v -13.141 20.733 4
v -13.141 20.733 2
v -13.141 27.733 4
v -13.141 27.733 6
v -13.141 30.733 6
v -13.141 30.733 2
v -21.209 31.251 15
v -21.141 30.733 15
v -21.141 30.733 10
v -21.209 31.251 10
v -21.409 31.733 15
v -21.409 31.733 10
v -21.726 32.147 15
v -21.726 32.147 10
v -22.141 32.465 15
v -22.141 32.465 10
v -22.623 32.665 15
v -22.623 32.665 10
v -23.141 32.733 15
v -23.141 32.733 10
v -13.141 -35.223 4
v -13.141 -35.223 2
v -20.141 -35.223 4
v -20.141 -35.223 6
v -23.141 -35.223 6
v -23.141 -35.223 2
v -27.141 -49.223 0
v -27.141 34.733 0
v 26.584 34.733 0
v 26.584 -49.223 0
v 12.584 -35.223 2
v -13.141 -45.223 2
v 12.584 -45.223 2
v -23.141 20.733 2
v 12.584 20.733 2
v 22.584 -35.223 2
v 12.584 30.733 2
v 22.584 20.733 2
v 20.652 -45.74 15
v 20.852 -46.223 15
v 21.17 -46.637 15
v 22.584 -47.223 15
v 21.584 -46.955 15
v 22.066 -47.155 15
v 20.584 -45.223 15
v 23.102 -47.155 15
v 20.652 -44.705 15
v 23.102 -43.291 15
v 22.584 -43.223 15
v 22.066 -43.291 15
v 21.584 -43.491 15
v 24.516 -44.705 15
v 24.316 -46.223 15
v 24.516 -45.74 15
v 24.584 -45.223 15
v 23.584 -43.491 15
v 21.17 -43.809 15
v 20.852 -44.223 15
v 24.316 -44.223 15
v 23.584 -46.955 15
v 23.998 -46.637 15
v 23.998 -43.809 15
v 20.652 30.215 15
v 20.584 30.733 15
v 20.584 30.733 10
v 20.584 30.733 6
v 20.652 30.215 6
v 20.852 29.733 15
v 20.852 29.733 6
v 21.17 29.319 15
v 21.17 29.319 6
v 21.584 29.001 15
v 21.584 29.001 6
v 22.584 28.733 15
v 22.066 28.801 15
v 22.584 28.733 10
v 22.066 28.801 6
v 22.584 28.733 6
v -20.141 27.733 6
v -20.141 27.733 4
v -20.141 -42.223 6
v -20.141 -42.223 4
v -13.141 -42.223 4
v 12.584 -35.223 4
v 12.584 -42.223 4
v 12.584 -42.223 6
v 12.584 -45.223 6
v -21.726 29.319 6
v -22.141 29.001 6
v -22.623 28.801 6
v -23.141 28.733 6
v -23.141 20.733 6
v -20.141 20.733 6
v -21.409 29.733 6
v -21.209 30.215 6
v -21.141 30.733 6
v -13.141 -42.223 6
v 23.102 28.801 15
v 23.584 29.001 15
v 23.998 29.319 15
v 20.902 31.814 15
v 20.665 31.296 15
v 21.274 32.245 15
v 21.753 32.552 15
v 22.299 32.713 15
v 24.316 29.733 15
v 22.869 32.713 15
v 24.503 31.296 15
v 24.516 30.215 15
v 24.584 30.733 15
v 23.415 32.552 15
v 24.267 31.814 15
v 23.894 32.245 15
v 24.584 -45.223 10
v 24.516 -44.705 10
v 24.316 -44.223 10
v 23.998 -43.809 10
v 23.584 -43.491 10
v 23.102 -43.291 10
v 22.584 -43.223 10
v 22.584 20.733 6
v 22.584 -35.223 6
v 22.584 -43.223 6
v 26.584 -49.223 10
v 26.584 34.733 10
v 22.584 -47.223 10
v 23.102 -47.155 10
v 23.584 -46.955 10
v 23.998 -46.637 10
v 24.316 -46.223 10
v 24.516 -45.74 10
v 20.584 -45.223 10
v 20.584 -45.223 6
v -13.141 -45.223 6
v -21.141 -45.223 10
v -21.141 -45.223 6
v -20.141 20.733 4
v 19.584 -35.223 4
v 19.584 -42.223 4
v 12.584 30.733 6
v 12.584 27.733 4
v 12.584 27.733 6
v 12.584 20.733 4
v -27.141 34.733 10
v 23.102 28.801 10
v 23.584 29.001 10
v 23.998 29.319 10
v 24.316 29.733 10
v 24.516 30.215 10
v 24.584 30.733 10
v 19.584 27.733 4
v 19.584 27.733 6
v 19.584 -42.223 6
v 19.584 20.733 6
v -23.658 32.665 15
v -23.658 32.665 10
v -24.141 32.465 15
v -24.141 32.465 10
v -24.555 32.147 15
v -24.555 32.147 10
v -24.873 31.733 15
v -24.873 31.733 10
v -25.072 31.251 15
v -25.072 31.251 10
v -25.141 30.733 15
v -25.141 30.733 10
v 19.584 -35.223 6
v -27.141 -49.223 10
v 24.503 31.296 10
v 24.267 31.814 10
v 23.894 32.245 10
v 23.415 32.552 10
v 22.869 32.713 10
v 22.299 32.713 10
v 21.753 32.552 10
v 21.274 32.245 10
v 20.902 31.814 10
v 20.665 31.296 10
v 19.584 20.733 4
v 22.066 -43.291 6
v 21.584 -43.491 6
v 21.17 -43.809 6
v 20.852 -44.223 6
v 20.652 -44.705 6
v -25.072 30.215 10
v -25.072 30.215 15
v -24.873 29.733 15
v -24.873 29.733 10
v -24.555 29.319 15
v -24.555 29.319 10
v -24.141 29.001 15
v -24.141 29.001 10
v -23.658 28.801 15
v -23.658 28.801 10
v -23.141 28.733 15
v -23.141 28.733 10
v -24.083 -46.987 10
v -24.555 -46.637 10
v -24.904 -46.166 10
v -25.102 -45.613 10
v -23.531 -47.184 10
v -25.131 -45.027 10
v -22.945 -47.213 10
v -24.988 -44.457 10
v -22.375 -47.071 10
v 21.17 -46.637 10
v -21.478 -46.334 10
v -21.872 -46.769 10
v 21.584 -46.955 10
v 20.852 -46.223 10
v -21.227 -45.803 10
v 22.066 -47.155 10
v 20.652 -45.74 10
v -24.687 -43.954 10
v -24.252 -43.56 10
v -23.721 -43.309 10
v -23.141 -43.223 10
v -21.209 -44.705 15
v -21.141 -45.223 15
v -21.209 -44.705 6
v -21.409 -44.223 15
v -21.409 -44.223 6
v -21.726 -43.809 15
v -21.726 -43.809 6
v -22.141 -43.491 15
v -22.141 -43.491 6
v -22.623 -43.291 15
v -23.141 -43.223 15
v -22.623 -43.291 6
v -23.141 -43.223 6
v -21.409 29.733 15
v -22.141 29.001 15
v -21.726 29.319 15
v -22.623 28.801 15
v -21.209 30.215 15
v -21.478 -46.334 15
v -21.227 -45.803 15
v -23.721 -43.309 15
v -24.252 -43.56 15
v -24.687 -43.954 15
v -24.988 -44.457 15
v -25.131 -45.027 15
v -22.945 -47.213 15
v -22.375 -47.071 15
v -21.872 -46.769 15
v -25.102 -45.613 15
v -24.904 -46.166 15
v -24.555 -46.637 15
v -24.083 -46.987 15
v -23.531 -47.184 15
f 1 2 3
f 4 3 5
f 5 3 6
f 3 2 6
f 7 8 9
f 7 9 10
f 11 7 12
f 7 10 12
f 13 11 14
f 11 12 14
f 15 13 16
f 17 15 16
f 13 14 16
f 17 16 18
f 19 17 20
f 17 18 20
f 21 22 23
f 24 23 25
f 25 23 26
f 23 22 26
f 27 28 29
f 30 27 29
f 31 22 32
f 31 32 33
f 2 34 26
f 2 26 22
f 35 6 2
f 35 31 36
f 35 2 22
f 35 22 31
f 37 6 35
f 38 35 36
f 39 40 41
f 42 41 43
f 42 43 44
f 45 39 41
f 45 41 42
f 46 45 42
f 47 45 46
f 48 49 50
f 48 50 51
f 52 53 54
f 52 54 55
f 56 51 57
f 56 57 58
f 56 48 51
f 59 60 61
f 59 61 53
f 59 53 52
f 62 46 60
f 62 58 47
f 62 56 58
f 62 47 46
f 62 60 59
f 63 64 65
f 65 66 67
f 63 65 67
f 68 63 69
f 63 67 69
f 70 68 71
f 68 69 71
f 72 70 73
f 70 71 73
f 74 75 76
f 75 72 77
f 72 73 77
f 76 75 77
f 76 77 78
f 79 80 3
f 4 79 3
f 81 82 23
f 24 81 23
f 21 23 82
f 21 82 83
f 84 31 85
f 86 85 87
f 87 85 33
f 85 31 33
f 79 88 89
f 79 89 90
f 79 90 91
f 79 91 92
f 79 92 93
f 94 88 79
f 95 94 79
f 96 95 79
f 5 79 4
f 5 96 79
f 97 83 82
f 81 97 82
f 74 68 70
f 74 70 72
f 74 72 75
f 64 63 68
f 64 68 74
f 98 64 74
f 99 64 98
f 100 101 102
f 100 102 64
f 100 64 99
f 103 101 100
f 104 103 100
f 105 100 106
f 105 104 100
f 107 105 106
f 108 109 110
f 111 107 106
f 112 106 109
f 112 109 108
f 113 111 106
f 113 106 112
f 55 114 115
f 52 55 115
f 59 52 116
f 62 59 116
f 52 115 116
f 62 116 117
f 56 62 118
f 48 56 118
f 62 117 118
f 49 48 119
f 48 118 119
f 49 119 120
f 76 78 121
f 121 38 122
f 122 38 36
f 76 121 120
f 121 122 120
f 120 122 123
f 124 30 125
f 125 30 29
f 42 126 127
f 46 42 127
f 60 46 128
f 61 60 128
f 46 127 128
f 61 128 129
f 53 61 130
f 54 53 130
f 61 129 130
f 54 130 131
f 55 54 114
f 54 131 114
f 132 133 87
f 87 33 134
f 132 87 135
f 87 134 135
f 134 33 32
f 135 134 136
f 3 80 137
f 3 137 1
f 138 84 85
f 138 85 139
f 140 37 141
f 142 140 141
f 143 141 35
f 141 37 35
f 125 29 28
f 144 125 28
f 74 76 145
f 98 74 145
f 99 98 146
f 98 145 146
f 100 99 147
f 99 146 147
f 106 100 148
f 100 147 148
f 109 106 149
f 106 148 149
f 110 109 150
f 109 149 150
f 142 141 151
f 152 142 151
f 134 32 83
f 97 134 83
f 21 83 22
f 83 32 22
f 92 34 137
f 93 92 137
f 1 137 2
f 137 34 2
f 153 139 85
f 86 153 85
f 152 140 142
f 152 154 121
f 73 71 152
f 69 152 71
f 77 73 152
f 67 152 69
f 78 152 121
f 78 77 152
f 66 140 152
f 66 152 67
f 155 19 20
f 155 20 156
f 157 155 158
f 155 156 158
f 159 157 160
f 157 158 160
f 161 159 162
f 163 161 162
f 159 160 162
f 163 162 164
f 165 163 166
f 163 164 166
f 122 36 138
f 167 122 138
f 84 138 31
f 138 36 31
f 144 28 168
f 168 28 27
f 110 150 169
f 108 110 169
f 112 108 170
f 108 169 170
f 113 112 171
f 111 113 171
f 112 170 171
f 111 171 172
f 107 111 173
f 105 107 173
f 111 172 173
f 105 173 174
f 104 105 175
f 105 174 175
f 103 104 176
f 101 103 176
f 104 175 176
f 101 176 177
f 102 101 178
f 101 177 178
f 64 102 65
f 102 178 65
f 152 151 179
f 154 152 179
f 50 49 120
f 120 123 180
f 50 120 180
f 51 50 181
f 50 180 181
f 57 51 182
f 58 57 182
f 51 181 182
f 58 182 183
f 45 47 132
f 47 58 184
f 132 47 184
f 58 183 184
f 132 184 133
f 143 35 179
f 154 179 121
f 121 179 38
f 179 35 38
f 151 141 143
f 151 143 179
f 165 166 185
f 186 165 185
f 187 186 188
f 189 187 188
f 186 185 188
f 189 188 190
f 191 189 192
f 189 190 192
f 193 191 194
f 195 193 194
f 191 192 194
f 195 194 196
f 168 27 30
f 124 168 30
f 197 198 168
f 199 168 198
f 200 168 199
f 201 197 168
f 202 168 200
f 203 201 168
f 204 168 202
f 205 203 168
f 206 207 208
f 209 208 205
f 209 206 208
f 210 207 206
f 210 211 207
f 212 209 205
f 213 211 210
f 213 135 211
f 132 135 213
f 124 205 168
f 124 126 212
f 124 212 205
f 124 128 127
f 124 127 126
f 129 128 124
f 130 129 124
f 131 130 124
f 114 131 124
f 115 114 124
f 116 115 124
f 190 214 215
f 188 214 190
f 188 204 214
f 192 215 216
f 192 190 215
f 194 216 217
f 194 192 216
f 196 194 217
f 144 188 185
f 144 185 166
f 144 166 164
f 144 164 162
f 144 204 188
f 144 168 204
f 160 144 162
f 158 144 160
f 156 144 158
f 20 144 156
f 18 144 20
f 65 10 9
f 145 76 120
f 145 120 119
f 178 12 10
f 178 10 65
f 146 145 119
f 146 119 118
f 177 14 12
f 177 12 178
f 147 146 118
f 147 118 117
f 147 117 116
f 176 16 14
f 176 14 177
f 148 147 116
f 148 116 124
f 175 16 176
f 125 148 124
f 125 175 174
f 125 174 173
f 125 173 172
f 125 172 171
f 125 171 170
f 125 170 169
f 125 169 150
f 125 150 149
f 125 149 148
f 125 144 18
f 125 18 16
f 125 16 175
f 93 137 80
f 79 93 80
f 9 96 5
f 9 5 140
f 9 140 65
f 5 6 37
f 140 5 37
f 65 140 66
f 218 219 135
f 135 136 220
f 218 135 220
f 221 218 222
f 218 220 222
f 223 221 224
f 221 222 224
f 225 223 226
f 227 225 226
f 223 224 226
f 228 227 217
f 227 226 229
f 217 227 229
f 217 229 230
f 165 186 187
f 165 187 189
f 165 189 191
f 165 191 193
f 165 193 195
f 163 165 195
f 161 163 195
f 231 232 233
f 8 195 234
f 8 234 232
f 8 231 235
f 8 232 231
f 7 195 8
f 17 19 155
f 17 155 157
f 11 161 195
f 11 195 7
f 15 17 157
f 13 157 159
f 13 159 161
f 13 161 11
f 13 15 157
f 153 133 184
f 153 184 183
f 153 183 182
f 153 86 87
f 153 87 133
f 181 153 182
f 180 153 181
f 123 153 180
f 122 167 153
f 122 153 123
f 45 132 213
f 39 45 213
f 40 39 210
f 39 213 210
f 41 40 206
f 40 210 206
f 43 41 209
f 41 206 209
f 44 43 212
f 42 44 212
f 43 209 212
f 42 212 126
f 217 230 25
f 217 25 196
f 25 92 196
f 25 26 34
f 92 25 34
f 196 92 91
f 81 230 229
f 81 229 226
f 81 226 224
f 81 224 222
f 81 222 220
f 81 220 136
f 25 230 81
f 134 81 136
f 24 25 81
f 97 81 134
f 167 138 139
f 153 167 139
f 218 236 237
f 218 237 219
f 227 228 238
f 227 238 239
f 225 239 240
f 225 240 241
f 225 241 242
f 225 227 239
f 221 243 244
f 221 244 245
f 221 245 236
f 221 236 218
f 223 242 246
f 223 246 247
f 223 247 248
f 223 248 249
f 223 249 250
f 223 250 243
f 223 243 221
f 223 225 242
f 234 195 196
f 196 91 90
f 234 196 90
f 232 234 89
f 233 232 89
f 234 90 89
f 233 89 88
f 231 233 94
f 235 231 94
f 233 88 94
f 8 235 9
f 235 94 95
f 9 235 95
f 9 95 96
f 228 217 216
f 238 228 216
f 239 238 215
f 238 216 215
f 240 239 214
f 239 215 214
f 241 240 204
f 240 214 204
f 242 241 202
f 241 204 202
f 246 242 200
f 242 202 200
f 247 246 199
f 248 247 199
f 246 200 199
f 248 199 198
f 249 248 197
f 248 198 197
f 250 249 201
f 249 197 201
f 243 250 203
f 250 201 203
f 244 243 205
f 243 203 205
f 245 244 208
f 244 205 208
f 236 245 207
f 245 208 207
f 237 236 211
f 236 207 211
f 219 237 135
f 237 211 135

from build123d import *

# Parameters (mm, degrees)
F1_DEPTH = 10
F2_DEPTH = 6
F3_DEPTH = 15
F0_W     = 7
F0_H     = 7
F4_DEPTH = 4
F5_DEPTH = 2


with BuildPart() as f1:
    # F0 (on Top) → F1 (new body)
    with BuildSketch(Plane.XY):
        with BuildLine():
            Line((26.5840129331, 34.7330055023), (-23.1406439107, 34.7330055023))
            Line((-23.1406439107, 34.7330055023), (-23.1406439107, 32.7330055023))
            ThreePointArc((-23.1406439107, 32.7330055023), (-21.7264303483, 32.1472190646), (-21.1406439107, 30.7330055023))
            Line((-21.1406439107, 30.7330055023), (-13.1406439107, 30.7330055023))
            Line((-13.1406439107, 30.7330055023), (12.5840129331, 30.7330055023))
            Line((12.5840129331, 30.7330055023), (20.5840129331, 30.7330055023))
            ThreePointArc((20.5840129331, 30.7330055023), (22.5840129331, 32.7330055023), (24.5840129331, 30.7330055023))
            ThreePointArc((24.5840129331, 30.7330055023), (23.9982264954, 29.3187919399), (22.5840129331, 28.7330055023))
            Line((22.5840129331, 28.7330055023), (22.5840129331, 20.7330055023))
            Line((22.5840129331, 20.7330055023), (22.5840129331, -35.2227493608))
            Line((22.5840129331, -35.2227493608), (22.5840129331, -43.2227493608))
            ThreePointArc((22.5840129331, -43.2227493608), (23.9982264954, -43.8085357985), (24.5840129331, -45.2227493608))
            Line((24.5840129331, -45.2227493608), (26.5840129331, -45.2227493608))
            Line((26.5840129331, -45.2227493608), (26.5840129331, 34.7330055023))
        make_face()
        with BuildLine():
            Line((-23.1406439107, 34.7330055023), (-27.1406439107, 34.7330055023))
            Line((-27.1406439107, 34.7330055023), (-27.1406439107, 30.7330055023))
            Line((-27.1406439107, 30.7330055023), (-25.1406439107, 30.7330055023))
            ThreePointArc((-25.1406439107, 30.7330055023), (-24.5548574731, 32.1472190646), (-23.1406439107, 32.7330055023))
            Line((-23.1406439107, 32.7330055023), (-23.1406439107, 34.7330055023))
        make_face()
        with BuildLine():
            Line((-25.1406439107, 30.7330055023), (-27.1406439107, 30.7330055023))
            Line((-27.1406439107, 30.7330055023), (-27.1406439107, -49.2227493608))
            Line((-27.1406439107, -49.2227493608), (22.5840129331, -49.2227493608))
            Line((22.5840129331, -49.2227493608), (22.5840129331, -47.2227493608))
            ThreePointArc((22.5840129331, -47.2227493608), (21.1697993707, -46.6369629232), (20.5840129331, -45.2227493608))
            Line((20.5840129331, -45.2227493608), (12.5840129331, -45.2227493608))
            Line((12.5840129331, -45.2227493608), (-13.1406439107, -45.2227493608))
            Line((-13.1406439107, -45.2227493608), (-21.1406439107, -45.2227493608))
            ThreePointArc((-21.1406439107, -45.2227493608), (-24.5548574731, -46.6369629232), (-23.1406439107, -43.2227493608))
            Line((-23.1406439107, -43.2227493608), (-23.1406439107, -35.2227493608))
            Line((-23.1406439107, -35.2227493608), (-23.1406439107, 20.7330055023))
            Line((-23.1406439107, 20.7330055023), (-23.1406439107, 28.7330055023))
            ThreePointArc((-23.1406439107, 28.7330055023), (-24.5548574731, 29.3187919399), (-25.1406439107, 30.7330055023))
        make_face()
        with BuildLine():
            Line((26.5840129331, -49.2227493608), (26.5840129331, -45.2227493608))
            Line((26.5840129331, -45.2227493608), (24.5840129331, -45.2227493608))
            ThreePointArc((24.5840129331, -45.2227493608), (23.9982264954, -46.6369629232), (22.5840129331, -47.2227493608))
            Line((22.5840129331, -47.2227493608), (22.5840129331, -49.2227493608))
            Line((22.5840129331, -49.2227493608), (26.5840129331, -49.2227493608))
        make_face()
    extrude(amount=F1_DEPTH)

    # F0 (on Top) → F2 (join)
    with BuildSketch(Plane.XY):
        with BuildLine():
            Line((-13.1406439107, 30.7330055023), (-21.1406439107, 30.7330055023))
            ThreePointArc((-21.1406439107, 30.7330055023), (-21.7264303483, 29.3187919399), (-23.1406439107, 28.7330055023))
            Line((-23.1406439107, 28.7330055023), (-23.1406439107, 20.7330055023))
            Line((-23.1406439107, 20.7330055023), (-20.1406439107, 20.7330055023))
            Line((-20.1406439107, 20.7330055023), (-20.1406439107, 27.7330055023))
            Line((-20.1406439107, 27.7330055023), (-13.1406439107, 27.7330055023))
            Line((-13.1406439107, 27.7330055023), (-13.1406439107, 30.7330055023))
        make_face()
        with BuildLine():
            Line((20.5840129331, 30.7330055023), (12.5840129331, 30.7330055023))
            Line((12.5840129331, 30.7330055023), (12.5840129331, 27.7330055023))
            Line((12.5840129331, 27.7330055023), (19.5840129331, 27.7330055023))
            Line((19.5840129331, 27.7330055023), (19.5840129331, 20.7330055023))
            Line((19.5840129331, 20.7330055023), (22.5840129331, 20.7330055023))
            Line((22.5840129331, 20.7330055023), (22.5840129331, 28.7330055023))
            ThreePointArc((22.5840129331, 28.7330055023), (21.1697993707, 29.3187919399), (20.5840129331, 30.7330055023))
        make_face()
        with BuildLine():
            ThreePointArc((20.5840129331, -45.2227493608), (21.1697993707, -43.8085357985), (22.5840129331, -43.2227493608))
            Line((22.5840129331, -43.2227493608), (22.5840129331, -35.2227493608))
            Line((22.5840129331, -35.2227493608), (19.5840129331, -35.2227493608))
            Line((19.5840129331, -35.2227493608), (19.5840129331, -42.2227493608))
            Line((19.5840129331, -42.2227493608), (12.5840129331, -42.2227493608))
            Line((12.5840129331, -42.2227493608), (12.5840129331, -45.2227493608))
            Line((12.5840129331, -45.2227493608), (20.5840129331, -45.2227493608))
        make_face()
        with BuildLine():
            Line((-20.1406439107, -35.2227493608), (-23.1406439107, -35.2227493608))
            Line((-23.1406439107, -35.2227493608), (-23.1406439107, -43.2227493608))
            ThreePointArc((-23.1406439107, -43.2227493608), (-21.7264303483, -43.8085357985), (-21.1406439107, -45.2227493608))
            Line((-21.1406439107, -45.2227493608), (-13.1406439107, -45.2227493608))
            Line((-13.1406439107, -45.2227493608), (-13.1406439107, -42.2227493608))
            Line((-13.1406439107, -42.2227493608), (-20.1406439107, -42.2227493608))
            Line((-20.1406439107, -42.2227493608), (-20.1406439107, -35.2227493608))
        make_face()
    extrude(amount=F2_DEPTH)

    # F0 (on Top) → F3 (join)
    with BuildSketch(Plane.XY):
        with BuildLine():
            Line((-21.1406439107, 30.7330055023), (-23.1406439107, 30.7330055023))
            Line((-23.1406439107, 30.7330055023), (-23.1406439107, 28.7330055023))
            ThreePointArc((-23.1406439107, 28.7330055023), (-21.7264303483, 29.3187919399), (-21.1406439107, 30.7330055023))
        make_face()
        with BuildLine():
            Line((-23.1406439107, 30.7330055023), (-23.1406439107, 32.7330055023))
            ThreePointArc((-23.1406439107, 32.7330055023), (-24.5548574731, 32.1472190646), (-25.1406439107, 30.7330055023))
            Line((-25.1406439107, 30.7330055023), (-23.1406439107, 30.7330055023))
        make_face()
        with BuildLine():
            ThreePointArc((-21.1406439107, 30.7330055023), (-21.7264303483, 32.1472190646), (-23.1406439107, 32.7330055023))
            Line((-23.1406439107, 32.7330055023), (-23.1406439107, 30.7330055023))
            Line((-23.1406439107, 30.7330055023), (-21.1406439107, 30.7330055023))
        make_face()
        with BuildLine():
            Line((-23.1406439107, 30.7330055023), (-25.1406439107, 30.7330055023))
            ThreePointArc((-25.1406439107, 30.7330055023), (-24.5548574731, 29.3187919399), (-23.1406439107, 28.7330055023))
            Line((-23.1406439107, 28.7330055023), (-23.1406439107, 30.7330055023))
        make_face()
        with BuildLine():
            ThreePointArc((24.5840129331, 30.7330055023), (22.5840129331, 32.7330055023), (20.5840129331, 30.7330055023))
            Line((20.5840129331, 30.7330055023), (22.5840129331, 30.7330055023))
            Line((22.5840129331, 30.7330055023), (22.5840129331, 28.7330055023))
            ThreePointArc((22.5840129331, 28.7330055023), (23.9982264954, 29.3187919399), (24.5840129331, 30.7330055023))
        make_face()
        with BuildLine():
            Line((22.5840129331, 30.7330055023), (20.5840129331, 30.7330055023))
            ThreePointArc((20.5840129331, 30.7330055023), (21.1697993707, 29.3187919399), (22.5840129331, 28.7330055023))
            Line((22.5840129331, 28.7330055023), (22.5840129331, 30.7330055023))
        make_face()
        with BuildLine():
            Line((20.5840129331, -45.2227493608), (22.5840129331, -45.2227493608))
            Line((22.5840129331, -45.2227493608), (22.5840129331, -43.2227493608))
            ThreePointArc((22.5840129331, -43.2227493608), (21.1697993707, -43.8085357985), (20.5840129331, -45.2227493608))
        make_face()
        with BuildLine():
            Line((22.5840129331, -45.2227493608), (24.5840129331, -45.2227493608))
            ThreePointArc((24.5840129331, -45.2227493608), (23.9982264954, -43.8085357985), (22.5840129331, -43.2227493608))
            Line((22.5840129331, -43.2227493608), (22.5840129331, -45.2227493608))
        make_face()
        with BuildLine():
            ThreePointArc((22.5840129331, -47.2227493608), (23.9982264954, -46.6369629232), (24.5840129331, -45.2227493608))
            Line((24.5840129331, -45.2227493608), (22.5840129331, -45.2227493608))
            Line((22.5840129331, -45.2227493608), (22.5840129331, -47.2227493608))
        make_face()
        with BuildLine():
            ThreePointArc((20.5840129331, -45.2227493608), (21.1697993707, -46.6369629232), (22.5840129331, -47.2227493608))
            Line((22.5840129331, -47.2227493608), (22.5840129331, -45.2227493608))
            Line((22.5840129331, -45.2227493608), (20.5840129331, -45.2227493608))
        make_face()
        with BuildLine():
            ThreePointArc((-21.1406439107, -45.2227493608), (-21.7264303483, -43.8085357985), (-23.1406439107, -43.2227493608))
            Line((-23.1406439107, -43.2227493608), (-23.1406439107, -45.2227493608))
            Line((-23.1406439107, -45.2227493608), (-21.1406439107, -45.2227493608))
        make_face()
        with BuildLine():
            Line((-23.1406439107, -45.2227493608), (-23.1406439107, -43.2227493608))
            ThreePointArc((-23.1406439107, -43.2227493608), (-24.5548574731, -46.6369629232), (-21.1406439107, -45.2227493608))
            Line((-21.1406439107, -45.2227493608), (-23.1406439107, -45.2227493608))
        make_face()
    extrude(amount=F3_DEPTH)

    # F0 (on Top) → F4 (join)
    with BuildSketch(Plane.XY):
        with Locations((-16.6406439107, 24.2330055023)):
            Rectangle(F0_W, F0_H)
        with Locations((16.0840129331, 24.2330055023)):
            Rectangle(F0_W, F0_H)
        with Locations((16.0840129331, -38.7227493608)):
            Rectangle(F0_W, F0_H)
        with Locations((-16.6406439107, -38.7227493608)):
            Rectangle(F0_W, F0_H)
    extrude(amount=F4_DEPTH)

    # F0 (on Top) → F5 (join)
    with BuildSketch(Plane.XY):
        Polygon((12.5840129331, 30.7330055023), (-13.1406439107, 30.7330055023), (-13.1406439107, 27.7330055023), (-13.1406439107, 20.7330055023), (-20.1406439107, 20.7330055023), (-23.1406439107, 20.7330055023), (-23.1406439107, -35.2227493608), (-20.1406439107, -35.2227493608), (-13.1406439107, -35.2227493608), (-13.1406439107, -42.2227493608), (-13.1406439107, -45.2227493608), (12.5840129331, -45.2227493608), (12.5840129331, -42.2227493608), (12.5840129331, -35.2227493608), (19.5840129331, -35.2227493608), (22.5840129331, -35.2227493608), (22.5840129331, 20.7330055023), (19.5840129331, 20.7330055023), (12.5840129331, 20.7330055023), (12.5840129331, 27.7330055023), align=None)
    extrude(amount=F5_DEPTH)


solid = f1.part
